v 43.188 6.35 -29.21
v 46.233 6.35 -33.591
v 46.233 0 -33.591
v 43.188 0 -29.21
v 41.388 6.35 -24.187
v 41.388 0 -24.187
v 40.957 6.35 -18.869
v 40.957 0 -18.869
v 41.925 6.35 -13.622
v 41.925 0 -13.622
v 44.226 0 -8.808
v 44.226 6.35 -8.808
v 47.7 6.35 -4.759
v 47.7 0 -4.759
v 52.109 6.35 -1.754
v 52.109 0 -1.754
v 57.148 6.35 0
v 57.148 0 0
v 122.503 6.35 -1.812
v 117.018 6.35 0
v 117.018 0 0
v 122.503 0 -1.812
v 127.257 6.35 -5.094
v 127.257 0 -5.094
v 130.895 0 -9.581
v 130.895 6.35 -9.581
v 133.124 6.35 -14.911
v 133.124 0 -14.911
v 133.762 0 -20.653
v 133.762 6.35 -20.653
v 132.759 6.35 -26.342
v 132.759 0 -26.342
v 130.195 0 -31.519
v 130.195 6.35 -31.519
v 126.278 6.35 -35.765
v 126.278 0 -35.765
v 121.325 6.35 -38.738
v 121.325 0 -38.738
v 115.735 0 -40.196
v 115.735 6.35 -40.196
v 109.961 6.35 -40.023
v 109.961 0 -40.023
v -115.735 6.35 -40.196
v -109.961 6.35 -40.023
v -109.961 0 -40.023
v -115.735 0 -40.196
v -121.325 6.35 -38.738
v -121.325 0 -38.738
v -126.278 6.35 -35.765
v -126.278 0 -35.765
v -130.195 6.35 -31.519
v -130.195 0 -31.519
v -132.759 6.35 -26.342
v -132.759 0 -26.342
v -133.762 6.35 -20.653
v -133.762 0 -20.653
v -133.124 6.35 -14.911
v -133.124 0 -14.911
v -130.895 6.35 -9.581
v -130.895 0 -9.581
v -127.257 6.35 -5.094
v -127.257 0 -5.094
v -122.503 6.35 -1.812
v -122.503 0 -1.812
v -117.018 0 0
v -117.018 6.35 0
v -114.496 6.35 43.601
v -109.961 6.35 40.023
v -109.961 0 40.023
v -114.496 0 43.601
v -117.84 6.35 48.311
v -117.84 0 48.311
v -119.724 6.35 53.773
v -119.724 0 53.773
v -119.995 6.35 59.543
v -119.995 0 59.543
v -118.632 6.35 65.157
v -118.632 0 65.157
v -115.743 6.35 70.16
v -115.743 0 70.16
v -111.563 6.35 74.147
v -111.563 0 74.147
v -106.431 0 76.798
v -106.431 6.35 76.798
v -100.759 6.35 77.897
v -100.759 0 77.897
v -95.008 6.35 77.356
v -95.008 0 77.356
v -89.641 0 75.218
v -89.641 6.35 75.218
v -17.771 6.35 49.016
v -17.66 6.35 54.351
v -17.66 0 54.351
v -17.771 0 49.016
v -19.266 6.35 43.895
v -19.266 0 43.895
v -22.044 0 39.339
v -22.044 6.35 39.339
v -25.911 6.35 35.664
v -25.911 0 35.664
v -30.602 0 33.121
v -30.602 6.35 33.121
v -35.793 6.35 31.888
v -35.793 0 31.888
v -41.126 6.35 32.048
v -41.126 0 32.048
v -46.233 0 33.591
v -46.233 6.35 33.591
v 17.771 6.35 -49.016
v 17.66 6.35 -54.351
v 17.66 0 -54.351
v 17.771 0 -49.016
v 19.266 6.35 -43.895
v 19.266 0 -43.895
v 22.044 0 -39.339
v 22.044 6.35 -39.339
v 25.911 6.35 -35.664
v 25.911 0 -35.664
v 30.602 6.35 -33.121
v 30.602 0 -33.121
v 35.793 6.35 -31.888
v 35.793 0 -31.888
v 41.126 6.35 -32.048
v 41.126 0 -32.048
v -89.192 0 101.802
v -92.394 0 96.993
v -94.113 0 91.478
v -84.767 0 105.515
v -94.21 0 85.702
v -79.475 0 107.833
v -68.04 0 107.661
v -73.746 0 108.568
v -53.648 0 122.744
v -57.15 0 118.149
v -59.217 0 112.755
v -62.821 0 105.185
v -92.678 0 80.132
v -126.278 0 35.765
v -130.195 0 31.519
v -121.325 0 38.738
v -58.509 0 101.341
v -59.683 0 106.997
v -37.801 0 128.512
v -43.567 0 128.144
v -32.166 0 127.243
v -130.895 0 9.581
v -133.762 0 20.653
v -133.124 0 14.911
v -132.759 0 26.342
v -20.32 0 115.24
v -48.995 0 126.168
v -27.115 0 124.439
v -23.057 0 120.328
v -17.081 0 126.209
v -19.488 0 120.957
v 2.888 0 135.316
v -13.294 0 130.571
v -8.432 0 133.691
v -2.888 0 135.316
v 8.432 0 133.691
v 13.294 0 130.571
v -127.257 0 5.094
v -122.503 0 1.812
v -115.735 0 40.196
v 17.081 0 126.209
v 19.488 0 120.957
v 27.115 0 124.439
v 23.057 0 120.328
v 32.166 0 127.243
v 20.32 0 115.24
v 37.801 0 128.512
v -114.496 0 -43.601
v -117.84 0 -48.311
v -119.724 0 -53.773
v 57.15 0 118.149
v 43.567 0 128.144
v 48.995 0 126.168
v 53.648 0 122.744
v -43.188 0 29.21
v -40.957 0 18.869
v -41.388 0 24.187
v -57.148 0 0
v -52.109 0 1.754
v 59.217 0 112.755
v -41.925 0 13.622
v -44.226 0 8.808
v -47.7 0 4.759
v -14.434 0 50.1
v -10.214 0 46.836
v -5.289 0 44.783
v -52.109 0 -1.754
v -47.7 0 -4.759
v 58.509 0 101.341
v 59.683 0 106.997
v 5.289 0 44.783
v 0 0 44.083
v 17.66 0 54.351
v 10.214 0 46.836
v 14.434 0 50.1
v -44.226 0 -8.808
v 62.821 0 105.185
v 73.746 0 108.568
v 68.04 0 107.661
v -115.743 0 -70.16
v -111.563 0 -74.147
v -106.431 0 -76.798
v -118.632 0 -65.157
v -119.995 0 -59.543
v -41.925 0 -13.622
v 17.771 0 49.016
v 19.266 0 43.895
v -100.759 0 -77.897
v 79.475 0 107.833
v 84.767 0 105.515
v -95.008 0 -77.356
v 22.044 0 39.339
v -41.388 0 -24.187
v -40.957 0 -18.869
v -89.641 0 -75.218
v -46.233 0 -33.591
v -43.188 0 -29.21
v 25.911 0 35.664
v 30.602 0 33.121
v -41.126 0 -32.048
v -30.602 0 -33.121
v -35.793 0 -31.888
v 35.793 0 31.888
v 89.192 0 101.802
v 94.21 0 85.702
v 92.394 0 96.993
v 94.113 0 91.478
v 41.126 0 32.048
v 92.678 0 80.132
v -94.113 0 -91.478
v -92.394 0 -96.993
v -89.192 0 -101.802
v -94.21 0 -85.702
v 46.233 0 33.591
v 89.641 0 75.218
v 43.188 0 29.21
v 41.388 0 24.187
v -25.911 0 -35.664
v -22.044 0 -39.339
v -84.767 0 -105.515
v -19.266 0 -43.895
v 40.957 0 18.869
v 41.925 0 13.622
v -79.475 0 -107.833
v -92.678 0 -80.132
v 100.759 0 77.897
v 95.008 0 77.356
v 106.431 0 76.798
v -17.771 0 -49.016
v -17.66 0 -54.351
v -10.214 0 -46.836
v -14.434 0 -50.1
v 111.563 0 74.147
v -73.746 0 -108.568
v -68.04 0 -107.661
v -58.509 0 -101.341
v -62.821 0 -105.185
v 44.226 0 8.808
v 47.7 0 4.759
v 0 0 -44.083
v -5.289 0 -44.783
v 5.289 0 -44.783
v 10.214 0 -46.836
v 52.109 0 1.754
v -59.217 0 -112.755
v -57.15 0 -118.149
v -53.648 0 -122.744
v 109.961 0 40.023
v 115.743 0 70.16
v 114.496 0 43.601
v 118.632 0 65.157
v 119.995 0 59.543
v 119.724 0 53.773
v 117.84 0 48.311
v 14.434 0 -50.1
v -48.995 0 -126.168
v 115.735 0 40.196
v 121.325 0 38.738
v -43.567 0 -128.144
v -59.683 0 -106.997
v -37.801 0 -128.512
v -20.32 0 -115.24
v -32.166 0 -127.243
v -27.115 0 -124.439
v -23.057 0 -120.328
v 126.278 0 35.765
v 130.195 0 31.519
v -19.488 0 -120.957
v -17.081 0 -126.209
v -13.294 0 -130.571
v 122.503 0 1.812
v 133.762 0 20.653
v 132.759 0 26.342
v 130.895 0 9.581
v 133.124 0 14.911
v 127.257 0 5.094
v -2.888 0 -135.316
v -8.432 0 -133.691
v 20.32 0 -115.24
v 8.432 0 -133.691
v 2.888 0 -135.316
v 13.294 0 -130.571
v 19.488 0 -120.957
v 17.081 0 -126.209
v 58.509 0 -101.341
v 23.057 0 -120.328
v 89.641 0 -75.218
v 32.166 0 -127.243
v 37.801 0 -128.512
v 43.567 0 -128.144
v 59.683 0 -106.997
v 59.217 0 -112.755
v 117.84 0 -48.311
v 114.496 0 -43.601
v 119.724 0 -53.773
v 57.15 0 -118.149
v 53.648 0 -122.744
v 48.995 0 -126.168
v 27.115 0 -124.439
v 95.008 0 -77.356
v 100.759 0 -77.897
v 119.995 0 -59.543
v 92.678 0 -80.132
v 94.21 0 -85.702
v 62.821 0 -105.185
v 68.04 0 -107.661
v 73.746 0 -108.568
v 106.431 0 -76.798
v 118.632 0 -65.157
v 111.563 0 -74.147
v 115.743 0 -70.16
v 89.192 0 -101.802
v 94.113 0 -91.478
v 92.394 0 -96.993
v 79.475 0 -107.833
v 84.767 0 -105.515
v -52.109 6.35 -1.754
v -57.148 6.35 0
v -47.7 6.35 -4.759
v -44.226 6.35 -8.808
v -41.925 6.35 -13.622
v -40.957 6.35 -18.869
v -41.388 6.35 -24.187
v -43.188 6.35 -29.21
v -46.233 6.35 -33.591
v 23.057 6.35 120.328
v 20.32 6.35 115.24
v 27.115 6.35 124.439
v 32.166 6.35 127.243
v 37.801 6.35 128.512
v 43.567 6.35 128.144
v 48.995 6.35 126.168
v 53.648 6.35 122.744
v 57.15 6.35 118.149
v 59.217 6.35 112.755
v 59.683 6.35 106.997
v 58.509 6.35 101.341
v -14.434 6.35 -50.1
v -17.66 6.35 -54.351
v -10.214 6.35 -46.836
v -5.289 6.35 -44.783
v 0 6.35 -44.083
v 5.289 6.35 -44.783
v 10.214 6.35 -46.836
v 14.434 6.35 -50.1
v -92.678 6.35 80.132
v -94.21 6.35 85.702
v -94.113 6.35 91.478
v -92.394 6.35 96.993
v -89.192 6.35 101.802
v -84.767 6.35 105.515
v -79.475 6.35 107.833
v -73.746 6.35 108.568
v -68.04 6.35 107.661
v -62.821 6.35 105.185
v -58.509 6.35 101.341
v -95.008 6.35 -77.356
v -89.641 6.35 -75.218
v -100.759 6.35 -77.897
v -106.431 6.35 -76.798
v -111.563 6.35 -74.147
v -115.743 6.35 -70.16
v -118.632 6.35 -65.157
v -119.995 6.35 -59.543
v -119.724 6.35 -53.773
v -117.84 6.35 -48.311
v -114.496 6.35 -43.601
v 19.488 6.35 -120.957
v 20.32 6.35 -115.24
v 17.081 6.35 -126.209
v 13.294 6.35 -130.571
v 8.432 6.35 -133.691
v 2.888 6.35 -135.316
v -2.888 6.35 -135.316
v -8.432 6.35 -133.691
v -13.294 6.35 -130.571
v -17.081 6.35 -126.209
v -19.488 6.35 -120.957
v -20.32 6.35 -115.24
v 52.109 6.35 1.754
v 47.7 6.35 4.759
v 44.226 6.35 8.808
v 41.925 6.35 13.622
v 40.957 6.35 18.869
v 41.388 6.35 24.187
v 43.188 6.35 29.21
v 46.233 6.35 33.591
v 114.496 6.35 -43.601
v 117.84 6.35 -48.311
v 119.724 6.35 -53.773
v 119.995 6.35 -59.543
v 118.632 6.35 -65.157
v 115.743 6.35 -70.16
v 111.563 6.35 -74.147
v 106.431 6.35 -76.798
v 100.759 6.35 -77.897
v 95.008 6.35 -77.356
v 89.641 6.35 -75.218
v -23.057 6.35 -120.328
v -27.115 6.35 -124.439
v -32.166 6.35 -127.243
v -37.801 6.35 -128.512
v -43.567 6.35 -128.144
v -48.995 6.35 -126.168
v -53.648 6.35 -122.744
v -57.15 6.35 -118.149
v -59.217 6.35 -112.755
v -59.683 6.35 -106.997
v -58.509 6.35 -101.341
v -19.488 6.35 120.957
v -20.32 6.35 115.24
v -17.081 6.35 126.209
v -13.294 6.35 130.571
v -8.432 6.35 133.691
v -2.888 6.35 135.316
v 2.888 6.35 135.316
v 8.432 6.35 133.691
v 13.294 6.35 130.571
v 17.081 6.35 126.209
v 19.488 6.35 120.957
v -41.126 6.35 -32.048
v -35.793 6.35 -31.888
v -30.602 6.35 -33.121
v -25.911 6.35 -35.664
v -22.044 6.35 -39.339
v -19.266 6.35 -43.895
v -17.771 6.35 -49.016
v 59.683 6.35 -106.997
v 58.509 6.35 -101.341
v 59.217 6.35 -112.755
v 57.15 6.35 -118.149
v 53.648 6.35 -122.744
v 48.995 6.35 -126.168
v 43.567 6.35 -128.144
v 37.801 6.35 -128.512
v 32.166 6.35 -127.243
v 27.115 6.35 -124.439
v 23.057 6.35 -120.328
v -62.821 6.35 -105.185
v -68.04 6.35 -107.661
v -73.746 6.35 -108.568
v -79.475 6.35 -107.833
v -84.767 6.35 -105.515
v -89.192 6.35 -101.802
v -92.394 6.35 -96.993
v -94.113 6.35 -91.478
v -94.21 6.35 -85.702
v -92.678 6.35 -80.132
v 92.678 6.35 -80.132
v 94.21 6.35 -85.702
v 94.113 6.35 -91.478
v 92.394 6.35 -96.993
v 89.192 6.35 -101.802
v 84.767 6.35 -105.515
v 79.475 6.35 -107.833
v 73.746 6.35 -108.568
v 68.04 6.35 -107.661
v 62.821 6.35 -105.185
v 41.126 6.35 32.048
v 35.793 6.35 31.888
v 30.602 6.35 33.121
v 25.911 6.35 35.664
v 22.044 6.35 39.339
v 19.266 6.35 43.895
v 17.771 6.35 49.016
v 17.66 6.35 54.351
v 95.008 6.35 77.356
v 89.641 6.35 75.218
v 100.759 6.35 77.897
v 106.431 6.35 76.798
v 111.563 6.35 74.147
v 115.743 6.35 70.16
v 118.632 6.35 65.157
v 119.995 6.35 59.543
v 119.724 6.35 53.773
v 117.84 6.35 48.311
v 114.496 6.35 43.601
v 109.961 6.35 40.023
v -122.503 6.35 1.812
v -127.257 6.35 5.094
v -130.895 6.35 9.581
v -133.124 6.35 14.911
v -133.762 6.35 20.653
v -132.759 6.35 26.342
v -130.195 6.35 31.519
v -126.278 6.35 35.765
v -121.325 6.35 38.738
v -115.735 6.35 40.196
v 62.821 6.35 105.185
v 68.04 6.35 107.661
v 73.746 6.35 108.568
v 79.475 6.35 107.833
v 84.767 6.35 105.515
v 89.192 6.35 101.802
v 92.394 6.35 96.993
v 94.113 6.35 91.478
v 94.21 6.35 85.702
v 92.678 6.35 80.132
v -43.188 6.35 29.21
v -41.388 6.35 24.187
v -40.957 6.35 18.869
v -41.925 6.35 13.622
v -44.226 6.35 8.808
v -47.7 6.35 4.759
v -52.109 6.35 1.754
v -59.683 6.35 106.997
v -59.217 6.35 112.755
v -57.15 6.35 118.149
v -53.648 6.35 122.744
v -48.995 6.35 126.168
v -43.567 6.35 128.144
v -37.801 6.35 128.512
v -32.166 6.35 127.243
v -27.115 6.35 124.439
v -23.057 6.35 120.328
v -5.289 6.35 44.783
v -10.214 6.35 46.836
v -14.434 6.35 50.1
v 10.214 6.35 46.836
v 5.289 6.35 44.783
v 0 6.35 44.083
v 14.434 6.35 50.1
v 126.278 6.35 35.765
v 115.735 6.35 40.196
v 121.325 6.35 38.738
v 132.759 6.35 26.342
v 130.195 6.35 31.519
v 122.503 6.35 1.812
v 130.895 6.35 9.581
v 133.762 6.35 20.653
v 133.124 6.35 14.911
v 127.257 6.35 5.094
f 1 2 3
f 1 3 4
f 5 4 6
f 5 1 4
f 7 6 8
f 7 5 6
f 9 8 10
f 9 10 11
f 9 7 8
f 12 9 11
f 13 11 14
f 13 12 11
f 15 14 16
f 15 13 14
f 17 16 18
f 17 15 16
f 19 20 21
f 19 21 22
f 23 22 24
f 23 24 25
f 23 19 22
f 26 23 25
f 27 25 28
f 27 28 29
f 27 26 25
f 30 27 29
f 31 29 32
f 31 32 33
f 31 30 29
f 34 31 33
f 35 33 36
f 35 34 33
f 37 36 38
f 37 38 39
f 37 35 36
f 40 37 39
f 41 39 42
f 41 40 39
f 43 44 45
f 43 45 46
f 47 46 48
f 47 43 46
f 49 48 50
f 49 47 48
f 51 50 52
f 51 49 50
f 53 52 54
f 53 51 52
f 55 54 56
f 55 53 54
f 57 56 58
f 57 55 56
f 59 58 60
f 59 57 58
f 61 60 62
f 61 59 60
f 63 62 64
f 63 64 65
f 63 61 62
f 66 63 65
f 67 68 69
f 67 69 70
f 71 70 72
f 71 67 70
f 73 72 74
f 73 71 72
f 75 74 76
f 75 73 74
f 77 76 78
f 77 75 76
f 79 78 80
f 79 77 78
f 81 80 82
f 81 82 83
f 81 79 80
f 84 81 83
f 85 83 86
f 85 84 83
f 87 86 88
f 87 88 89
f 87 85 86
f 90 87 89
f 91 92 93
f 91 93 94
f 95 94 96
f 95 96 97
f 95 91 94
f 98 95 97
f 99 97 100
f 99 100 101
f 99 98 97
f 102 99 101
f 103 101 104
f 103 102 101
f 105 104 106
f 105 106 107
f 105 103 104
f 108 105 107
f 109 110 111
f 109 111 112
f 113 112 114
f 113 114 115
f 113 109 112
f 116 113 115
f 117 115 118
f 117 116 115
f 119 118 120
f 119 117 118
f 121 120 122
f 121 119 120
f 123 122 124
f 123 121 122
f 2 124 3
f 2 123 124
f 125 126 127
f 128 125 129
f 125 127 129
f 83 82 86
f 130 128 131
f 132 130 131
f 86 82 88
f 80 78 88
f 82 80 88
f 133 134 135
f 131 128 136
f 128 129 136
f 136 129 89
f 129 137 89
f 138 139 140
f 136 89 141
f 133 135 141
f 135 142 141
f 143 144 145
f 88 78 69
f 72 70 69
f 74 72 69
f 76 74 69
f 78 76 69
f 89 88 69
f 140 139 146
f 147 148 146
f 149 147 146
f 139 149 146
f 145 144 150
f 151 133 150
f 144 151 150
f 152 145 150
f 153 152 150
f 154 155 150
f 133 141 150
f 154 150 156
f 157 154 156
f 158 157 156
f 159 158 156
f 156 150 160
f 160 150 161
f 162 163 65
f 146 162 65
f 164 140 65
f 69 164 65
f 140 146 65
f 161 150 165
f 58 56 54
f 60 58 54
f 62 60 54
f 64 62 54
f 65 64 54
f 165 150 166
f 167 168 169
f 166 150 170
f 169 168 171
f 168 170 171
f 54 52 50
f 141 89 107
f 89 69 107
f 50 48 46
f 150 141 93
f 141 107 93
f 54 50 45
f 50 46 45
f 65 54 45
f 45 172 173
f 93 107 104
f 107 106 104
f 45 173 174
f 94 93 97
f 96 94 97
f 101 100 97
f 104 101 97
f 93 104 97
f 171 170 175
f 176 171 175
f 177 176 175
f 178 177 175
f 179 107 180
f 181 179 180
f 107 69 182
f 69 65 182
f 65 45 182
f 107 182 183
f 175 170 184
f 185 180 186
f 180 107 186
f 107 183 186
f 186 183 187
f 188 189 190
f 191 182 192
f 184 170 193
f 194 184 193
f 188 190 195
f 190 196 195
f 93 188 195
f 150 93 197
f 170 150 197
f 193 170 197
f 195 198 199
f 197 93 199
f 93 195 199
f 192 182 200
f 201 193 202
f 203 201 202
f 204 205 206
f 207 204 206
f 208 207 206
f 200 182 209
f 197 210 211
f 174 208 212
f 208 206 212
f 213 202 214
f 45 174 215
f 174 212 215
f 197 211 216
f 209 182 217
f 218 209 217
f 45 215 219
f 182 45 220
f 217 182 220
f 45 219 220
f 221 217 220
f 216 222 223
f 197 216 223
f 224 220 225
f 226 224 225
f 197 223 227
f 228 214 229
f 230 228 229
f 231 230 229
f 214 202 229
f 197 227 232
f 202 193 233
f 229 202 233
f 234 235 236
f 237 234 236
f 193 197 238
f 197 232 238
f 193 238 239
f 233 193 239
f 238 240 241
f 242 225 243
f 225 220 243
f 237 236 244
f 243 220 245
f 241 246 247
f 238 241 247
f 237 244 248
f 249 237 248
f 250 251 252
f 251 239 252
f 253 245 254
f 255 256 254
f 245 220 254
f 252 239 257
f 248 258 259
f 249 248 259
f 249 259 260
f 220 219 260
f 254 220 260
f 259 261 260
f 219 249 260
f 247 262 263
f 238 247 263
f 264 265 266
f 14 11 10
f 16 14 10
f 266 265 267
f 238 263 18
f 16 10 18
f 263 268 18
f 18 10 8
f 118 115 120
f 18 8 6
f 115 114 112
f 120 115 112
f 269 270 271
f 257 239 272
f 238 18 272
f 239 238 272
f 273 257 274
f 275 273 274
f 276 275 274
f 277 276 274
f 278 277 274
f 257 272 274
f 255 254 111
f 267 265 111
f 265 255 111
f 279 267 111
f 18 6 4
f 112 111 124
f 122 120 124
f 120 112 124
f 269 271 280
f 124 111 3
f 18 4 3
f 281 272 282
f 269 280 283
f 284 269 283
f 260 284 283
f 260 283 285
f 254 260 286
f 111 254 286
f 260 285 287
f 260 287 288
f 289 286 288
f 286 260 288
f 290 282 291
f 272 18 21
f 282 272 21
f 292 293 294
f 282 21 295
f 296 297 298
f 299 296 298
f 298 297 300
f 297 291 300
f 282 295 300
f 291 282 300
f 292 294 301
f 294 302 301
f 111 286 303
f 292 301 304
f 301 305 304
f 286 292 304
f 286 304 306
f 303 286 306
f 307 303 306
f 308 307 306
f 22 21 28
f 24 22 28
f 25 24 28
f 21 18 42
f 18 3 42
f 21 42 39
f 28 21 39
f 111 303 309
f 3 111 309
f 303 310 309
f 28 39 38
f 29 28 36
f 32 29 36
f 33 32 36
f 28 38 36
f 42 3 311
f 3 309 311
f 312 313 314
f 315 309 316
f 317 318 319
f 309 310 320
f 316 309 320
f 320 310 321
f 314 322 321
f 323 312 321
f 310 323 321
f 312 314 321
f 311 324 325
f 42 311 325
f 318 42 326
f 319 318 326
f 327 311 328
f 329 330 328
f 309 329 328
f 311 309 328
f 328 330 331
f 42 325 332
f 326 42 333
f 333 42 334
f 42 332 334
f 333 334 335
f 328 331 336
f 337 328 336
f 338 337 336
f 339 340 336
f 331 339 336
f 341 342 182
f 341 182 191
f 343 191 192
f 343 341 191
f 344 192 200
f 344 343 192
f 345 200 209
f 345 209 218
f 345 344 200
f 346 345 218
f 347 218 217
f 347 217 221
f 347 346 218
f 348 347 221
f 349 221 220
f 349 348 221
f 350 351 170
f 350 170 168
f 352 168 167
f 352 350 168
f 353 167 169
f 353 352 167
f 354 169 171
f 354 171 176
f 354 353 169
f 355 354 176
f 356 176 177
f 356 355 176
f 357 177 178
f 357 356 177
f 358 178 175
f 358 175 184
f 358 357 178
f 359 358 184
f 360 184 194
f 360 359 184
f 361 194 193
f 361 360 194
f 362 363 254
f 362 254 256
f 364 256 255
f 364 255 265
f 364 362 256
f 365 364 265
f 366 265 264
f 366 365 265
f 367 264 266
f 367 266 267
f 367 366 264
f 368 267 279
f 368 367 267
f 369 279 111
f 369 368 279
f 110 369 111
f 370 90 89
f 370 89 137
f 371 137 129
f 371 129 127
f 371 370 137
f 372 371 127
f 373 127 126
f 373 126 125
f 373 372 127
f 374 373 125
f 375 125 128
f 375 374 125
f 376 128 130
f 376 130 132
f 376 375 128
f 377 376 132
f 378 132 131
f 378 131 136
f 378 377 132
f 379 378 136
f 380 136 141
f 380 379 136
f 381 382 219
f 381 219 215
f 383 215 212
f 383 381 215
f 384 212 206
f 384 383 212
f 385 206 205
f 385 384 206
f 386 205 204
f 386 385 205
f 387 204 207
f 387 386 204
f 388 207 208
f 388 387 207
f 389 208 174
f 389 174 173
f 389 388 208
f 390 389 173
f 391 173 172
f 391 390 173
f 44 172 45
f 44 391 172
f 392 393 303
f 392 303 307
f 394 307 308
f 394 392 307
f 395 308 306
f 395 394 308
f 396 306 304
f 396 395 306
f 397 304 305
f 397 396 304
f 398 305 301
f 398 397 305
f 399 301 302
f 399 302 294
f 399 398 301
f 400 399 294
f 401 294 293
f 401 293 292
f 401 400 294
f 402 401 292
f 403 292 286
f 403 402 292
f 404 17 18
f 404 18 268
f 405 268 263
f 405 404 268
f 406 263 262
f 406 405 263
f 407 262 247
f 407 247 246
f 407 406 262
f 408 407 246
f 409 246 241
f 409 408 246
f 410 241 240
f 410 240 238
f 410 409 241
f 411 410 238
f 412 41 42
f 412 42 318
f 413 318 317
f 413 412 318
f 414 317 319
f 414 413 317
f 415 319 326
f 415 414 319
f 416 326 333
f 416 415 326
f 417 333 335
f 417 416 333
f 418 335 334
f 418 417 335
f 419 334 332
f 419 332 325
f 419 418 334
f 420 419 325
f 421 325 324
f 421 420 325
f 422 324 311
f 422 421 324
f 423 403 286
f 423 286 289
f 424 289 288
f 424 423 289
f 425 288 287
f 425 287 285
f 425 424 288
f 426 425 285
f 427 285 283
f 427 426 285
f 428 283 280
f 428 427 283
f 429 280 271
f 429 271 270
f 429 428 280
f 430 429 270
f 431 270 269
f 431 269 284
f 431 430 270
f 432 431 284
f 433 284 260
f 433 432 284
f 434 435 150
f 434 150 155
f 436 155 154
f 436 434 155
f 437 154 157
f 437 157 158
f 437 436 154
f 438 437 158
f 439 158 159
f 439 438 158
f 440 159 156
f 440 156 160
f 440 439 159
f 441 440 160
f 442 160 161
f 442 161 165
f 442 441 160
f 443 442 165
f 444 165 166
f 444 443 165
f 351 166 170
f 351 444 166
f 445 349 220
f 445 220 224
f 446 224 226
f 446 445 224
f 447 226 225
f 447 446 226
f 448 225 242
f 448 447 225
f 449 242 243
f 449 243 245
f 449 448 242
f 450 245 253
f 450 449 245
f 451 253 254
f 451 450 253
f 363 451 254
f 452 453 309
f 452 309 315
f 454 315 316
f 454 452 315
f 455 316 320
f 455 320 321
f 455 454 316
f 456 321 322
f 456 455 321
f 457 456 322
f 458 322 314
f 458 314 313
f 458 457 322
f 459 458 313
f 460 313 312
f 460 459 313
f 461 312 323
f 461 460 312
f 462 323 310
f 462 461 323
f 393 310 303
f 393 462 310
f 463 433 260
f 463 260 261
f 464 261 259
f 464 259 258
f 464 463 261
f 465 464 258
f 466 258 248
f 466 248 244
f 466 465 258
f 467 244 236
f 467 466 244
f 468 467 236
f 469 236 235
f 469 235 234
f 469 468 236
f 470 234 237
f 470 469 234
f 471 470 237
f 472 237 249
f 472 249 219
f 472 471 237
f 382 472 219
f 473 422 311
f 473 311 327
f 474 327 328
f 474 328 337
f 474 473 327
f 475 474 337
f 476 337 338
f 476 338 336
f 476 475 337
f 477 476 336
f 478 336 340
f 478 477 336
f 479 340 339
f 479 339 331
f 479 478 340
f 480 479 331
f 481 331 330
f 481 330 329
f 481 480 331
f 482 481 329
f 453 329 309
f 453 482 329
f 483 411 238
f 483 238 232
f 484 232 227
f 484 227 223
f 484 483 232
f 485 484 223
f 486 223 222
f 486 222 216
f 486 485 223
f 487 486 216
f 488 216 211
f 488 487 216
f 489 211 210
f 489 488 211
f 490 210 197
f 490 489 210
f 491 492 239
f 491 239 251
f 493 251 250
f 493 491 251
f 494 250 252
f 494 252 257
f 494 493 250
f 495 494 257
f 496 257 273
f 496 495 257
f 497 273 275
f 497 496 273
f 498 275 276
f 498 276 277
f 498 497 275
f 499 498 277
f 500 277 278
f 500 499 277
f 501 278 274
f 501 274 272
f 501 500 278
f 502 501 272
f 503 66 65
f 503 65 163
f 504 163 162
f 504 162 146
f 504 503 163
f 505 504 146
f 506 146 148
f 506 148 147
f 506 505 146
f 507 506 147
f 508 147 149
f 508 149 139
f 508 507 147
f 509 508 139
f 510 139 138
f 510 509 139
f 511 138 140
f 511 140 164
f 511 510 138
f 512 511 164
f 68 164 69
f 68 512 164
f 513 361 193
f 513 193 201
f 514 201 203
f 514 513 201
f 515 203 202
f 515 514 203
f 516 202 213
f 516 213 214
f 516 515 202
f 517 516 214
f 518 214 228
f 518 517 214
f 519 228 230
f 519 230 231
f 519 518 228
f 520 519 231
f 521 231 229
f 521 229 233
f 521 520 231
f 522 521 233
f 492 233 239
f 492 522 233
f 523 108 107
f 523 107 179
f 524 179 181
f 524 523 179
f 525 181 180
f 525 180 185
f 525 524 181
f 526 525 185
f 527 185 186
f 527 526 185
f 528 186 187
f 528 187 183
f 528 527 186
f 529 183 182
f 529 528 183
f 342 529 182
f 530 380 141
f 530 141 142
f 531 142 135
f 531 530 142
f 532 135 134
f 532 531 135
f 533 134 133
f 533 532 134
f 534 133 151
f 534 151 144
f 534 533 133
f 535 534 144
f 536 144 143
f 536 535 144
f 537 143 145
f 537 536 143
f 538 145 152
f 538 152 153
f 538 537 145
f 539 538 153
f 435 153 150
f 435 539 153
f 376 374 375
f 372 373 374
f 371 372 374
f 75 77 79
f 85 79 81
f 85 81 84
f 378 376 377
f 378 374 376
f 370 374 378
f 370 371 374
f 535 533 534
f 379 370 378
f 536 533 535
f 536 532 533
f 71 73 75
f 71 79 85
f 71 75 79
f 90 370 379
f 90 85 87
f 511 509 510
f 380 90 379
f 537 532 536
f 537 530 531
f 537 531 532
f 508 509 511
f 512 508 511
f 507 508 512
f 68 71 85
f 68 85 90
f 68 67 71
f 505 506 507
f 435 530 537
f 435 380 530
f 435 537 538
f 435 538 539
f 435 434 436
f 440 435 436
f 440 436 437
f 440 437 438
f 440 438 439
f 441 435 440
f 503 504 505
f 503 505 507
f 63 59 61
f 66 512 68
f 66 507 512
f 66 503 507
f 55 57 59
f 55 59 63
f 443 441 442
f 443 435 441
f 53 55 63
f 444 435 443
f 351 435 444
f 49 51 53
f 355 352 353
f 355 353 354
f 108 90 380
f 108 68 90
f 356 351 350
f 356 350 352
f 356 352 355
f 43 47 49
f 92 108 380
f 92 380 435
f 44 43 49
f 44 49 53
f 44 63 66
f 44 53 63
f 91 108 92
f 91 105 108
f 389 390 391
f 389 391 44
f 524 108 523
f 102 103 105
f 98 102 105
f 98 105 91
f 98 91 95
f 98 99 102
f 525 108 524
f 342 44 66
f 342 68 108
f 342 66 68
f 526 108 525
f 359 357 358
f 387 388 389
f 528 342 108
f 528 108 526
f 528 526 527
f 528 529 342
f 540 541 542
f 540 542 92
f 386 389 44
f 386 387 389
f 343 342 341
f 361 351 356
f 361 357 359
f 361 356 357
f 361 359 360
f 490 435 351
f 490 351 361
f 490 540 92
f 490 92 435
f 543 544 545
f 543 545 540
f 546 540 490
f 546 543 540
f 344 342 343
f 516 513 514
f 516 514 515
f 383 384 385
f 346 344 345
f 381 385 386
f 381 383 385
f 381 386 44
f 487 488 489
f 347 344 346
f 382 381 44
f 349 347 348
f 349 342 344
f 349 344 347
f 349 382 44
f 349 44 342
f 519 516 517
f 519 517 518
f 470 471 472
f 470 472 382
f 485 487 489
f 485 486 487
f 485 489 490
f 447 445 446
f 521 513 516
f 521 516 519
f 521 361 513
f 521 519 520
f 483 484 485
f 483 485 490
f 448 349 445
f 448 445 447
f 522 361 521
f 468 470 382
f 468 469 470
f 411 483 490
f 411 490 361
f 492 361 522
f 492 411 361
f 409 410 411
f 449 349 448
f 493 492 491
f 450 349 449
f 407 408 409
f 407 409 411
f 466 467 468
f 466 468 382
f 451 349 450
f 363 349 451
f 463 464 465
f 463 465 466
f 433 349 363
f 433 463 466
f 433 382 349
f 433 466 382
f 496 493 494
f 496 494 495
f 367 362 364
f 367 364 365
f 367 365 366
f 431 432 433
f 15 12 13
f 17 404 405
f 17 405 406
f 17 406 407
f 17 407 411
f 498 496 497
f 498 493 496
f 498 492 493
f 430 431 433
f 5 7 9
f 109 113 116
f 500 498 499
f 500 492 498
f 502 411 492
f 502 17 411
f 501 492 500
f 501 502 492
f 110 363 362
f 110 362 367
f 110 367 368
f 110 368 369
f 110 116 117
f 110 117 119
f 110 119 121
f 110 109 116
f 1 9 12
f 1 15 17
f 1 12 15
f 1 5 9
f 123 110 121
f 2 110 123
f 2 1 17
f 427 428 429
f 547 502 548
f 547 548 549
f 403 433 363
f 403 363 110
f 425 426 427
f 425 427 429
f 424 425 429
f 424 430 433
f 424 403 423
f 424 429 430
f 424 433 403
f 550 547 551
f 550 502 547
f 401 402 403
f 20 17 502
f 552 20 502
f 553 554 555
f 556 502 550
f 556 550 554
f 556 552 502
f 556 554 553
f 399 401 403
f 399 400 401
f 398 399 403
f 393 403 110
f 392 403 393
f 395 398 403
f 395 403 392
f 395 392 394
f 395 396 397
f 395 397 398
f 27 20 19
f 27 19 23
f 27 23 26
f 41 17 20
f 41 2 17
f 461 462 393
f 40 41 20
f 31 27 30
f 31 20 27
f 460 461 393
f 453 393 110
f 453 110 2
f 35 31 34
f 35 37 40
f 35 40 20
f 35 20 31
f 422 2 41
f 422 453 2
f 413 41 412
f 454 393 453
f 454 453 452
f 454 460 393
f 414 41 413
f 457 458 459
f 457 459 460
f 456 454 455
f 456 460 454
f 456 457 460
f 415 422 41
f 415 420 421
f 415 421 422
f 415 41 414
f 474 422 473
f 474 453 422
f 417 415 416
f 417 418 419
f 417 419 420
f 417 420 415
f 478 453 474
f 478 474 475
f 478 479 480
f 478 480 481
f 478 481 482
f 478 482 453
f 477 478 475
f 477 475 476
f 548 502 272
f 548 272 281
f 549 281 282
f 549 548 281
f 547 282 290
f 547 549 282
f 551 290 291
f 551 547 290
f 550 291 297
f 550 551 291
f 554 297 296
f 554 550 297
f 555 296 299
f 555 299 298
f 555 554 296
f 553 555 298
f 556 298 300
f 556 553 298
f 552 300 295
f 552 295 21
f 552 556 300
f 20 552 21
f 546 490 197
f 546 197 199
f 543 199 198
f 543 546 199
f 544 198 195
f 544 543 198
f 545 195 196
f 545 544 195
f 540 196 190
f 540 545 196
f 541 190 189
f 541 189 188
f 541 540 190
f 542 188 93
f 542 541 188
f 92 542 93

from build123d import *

# Parameters (mm, degrees)
SKETCH1_R           = 115.202561211
SKETCH1_R_2         = 64.402561211
BOSS_EXTRUDE1_DEPTH = 6.35
SKETCH2_R           = 20.32
BOSS_EXTRUDE2_DEPTH = 6.35


with BuildPart() as part:
    # Sketch1 → Boss-Extrude1 (new body)
    with BuildSketch(Plane(origin=(0, 0, 0), x_dir=(1, 0, 0), z_dir=(0, 1, 0))):
        Circle(SKETCH1_R)
        Circle(SKETCH1_R_2, mode=Mode.SUBTRACT)
    extrude(amount=BOSS_EXTRUDE1_DEPTH)

    # Sketch2 → Boss-Extrude2 (add)
    with BuildSketch(Plane(origin=(0, 6.35, 0), x_dir=(1, 0, 0), z_dir=(0, 1, 0))):
        with Locations((0, 64.402561211)):
            Circle(SKETCH2_R)
        with Locations((0, 115.202561211)):
            Circle(SKETCH2_R)
        with Locations((37.85487569, 52.102766501)):
            Circle(SKETCH2_R)
        with Locations((61.250475506, 19.901485895)):
            Circle(SKETCH2_R)
        with Locations((61.250475506, -19.901485895)):
            Circle(SKETCH2_R)
        with Locations((37.85487569, -52.102766501)):
            Circle(SKETCH2_R)
        with Locations((0, -64.402561211)):
            Circle(SKETCH2_R)
        with Locations((-37.85487569, -52.102766501)):
            Circle(SKETCH2_R)
        with Locations((-61.250475506, -19.901485895)):
            Circle(SKETCH2_R)
        with Locations((-61.250475506, 19.901485895)):
            Circle(SKETCH2_R)
        with Locations((-37.85487569, 52.102766501)):
            Circle(SKETCH2_R)
        with Locations((39.401596497, 108.254996665)):
            Circle(SKETCH2_R)
        with Locations((74.05077895, 88.250281849)):
            Circle(SKETCH2_R)
        with Locations((99.768344589, 57.601280605)):
            Circle(SKETCH2_R)
        with Locations((113.452375447, 20.004714817)):
            Circle(SKETCH2_R)
        with Locations((113.452375447, -20.004714817)):
            Circle(SKETCH2_R)
        with Locations((99.76834459, -57.601280605)):
            Circle(SKETCH2_R)
        with Locations((74.05077895, -88.250281849)):
            Circle(SKETCH2_R)
        with Locations((39.401596497, -108.254996665)):
            Circle(SKETCH2_R)
        with Locations((0, -115.202561211)):
            Circle(SKETCH2_R)
        with Locations((-39.401596497, -108.254996665)):
            Circle(SKETCH2_R)
        with Locations((-74.05077895, -88.250281849)):
            Circle(SKETCH2_R)
        with Locations((-99.768344589, -57.601280605)):
            Circle(SKETCH2_R)
        with Locations((-113.452375447, -20.004714817)):
            Circle(SKETCH2_R)
        with Locations((-113.452375447, 20.004714817)):
            Circle(SKETCH2_R)
        with Locations((-99.768344589, 57.601280605)):
            Circle(SKETCH2_R)
        with Locations((-74.05077895, 88.250281849)):
            Circle(SKETCH2_R)
        with Locations((-39.401596497, 108.254996665)):
            Circle(SKETCH2_R)
    extrude(amount=-BOSS_EXTRUDE2_DEPTH)


solid = part.part
